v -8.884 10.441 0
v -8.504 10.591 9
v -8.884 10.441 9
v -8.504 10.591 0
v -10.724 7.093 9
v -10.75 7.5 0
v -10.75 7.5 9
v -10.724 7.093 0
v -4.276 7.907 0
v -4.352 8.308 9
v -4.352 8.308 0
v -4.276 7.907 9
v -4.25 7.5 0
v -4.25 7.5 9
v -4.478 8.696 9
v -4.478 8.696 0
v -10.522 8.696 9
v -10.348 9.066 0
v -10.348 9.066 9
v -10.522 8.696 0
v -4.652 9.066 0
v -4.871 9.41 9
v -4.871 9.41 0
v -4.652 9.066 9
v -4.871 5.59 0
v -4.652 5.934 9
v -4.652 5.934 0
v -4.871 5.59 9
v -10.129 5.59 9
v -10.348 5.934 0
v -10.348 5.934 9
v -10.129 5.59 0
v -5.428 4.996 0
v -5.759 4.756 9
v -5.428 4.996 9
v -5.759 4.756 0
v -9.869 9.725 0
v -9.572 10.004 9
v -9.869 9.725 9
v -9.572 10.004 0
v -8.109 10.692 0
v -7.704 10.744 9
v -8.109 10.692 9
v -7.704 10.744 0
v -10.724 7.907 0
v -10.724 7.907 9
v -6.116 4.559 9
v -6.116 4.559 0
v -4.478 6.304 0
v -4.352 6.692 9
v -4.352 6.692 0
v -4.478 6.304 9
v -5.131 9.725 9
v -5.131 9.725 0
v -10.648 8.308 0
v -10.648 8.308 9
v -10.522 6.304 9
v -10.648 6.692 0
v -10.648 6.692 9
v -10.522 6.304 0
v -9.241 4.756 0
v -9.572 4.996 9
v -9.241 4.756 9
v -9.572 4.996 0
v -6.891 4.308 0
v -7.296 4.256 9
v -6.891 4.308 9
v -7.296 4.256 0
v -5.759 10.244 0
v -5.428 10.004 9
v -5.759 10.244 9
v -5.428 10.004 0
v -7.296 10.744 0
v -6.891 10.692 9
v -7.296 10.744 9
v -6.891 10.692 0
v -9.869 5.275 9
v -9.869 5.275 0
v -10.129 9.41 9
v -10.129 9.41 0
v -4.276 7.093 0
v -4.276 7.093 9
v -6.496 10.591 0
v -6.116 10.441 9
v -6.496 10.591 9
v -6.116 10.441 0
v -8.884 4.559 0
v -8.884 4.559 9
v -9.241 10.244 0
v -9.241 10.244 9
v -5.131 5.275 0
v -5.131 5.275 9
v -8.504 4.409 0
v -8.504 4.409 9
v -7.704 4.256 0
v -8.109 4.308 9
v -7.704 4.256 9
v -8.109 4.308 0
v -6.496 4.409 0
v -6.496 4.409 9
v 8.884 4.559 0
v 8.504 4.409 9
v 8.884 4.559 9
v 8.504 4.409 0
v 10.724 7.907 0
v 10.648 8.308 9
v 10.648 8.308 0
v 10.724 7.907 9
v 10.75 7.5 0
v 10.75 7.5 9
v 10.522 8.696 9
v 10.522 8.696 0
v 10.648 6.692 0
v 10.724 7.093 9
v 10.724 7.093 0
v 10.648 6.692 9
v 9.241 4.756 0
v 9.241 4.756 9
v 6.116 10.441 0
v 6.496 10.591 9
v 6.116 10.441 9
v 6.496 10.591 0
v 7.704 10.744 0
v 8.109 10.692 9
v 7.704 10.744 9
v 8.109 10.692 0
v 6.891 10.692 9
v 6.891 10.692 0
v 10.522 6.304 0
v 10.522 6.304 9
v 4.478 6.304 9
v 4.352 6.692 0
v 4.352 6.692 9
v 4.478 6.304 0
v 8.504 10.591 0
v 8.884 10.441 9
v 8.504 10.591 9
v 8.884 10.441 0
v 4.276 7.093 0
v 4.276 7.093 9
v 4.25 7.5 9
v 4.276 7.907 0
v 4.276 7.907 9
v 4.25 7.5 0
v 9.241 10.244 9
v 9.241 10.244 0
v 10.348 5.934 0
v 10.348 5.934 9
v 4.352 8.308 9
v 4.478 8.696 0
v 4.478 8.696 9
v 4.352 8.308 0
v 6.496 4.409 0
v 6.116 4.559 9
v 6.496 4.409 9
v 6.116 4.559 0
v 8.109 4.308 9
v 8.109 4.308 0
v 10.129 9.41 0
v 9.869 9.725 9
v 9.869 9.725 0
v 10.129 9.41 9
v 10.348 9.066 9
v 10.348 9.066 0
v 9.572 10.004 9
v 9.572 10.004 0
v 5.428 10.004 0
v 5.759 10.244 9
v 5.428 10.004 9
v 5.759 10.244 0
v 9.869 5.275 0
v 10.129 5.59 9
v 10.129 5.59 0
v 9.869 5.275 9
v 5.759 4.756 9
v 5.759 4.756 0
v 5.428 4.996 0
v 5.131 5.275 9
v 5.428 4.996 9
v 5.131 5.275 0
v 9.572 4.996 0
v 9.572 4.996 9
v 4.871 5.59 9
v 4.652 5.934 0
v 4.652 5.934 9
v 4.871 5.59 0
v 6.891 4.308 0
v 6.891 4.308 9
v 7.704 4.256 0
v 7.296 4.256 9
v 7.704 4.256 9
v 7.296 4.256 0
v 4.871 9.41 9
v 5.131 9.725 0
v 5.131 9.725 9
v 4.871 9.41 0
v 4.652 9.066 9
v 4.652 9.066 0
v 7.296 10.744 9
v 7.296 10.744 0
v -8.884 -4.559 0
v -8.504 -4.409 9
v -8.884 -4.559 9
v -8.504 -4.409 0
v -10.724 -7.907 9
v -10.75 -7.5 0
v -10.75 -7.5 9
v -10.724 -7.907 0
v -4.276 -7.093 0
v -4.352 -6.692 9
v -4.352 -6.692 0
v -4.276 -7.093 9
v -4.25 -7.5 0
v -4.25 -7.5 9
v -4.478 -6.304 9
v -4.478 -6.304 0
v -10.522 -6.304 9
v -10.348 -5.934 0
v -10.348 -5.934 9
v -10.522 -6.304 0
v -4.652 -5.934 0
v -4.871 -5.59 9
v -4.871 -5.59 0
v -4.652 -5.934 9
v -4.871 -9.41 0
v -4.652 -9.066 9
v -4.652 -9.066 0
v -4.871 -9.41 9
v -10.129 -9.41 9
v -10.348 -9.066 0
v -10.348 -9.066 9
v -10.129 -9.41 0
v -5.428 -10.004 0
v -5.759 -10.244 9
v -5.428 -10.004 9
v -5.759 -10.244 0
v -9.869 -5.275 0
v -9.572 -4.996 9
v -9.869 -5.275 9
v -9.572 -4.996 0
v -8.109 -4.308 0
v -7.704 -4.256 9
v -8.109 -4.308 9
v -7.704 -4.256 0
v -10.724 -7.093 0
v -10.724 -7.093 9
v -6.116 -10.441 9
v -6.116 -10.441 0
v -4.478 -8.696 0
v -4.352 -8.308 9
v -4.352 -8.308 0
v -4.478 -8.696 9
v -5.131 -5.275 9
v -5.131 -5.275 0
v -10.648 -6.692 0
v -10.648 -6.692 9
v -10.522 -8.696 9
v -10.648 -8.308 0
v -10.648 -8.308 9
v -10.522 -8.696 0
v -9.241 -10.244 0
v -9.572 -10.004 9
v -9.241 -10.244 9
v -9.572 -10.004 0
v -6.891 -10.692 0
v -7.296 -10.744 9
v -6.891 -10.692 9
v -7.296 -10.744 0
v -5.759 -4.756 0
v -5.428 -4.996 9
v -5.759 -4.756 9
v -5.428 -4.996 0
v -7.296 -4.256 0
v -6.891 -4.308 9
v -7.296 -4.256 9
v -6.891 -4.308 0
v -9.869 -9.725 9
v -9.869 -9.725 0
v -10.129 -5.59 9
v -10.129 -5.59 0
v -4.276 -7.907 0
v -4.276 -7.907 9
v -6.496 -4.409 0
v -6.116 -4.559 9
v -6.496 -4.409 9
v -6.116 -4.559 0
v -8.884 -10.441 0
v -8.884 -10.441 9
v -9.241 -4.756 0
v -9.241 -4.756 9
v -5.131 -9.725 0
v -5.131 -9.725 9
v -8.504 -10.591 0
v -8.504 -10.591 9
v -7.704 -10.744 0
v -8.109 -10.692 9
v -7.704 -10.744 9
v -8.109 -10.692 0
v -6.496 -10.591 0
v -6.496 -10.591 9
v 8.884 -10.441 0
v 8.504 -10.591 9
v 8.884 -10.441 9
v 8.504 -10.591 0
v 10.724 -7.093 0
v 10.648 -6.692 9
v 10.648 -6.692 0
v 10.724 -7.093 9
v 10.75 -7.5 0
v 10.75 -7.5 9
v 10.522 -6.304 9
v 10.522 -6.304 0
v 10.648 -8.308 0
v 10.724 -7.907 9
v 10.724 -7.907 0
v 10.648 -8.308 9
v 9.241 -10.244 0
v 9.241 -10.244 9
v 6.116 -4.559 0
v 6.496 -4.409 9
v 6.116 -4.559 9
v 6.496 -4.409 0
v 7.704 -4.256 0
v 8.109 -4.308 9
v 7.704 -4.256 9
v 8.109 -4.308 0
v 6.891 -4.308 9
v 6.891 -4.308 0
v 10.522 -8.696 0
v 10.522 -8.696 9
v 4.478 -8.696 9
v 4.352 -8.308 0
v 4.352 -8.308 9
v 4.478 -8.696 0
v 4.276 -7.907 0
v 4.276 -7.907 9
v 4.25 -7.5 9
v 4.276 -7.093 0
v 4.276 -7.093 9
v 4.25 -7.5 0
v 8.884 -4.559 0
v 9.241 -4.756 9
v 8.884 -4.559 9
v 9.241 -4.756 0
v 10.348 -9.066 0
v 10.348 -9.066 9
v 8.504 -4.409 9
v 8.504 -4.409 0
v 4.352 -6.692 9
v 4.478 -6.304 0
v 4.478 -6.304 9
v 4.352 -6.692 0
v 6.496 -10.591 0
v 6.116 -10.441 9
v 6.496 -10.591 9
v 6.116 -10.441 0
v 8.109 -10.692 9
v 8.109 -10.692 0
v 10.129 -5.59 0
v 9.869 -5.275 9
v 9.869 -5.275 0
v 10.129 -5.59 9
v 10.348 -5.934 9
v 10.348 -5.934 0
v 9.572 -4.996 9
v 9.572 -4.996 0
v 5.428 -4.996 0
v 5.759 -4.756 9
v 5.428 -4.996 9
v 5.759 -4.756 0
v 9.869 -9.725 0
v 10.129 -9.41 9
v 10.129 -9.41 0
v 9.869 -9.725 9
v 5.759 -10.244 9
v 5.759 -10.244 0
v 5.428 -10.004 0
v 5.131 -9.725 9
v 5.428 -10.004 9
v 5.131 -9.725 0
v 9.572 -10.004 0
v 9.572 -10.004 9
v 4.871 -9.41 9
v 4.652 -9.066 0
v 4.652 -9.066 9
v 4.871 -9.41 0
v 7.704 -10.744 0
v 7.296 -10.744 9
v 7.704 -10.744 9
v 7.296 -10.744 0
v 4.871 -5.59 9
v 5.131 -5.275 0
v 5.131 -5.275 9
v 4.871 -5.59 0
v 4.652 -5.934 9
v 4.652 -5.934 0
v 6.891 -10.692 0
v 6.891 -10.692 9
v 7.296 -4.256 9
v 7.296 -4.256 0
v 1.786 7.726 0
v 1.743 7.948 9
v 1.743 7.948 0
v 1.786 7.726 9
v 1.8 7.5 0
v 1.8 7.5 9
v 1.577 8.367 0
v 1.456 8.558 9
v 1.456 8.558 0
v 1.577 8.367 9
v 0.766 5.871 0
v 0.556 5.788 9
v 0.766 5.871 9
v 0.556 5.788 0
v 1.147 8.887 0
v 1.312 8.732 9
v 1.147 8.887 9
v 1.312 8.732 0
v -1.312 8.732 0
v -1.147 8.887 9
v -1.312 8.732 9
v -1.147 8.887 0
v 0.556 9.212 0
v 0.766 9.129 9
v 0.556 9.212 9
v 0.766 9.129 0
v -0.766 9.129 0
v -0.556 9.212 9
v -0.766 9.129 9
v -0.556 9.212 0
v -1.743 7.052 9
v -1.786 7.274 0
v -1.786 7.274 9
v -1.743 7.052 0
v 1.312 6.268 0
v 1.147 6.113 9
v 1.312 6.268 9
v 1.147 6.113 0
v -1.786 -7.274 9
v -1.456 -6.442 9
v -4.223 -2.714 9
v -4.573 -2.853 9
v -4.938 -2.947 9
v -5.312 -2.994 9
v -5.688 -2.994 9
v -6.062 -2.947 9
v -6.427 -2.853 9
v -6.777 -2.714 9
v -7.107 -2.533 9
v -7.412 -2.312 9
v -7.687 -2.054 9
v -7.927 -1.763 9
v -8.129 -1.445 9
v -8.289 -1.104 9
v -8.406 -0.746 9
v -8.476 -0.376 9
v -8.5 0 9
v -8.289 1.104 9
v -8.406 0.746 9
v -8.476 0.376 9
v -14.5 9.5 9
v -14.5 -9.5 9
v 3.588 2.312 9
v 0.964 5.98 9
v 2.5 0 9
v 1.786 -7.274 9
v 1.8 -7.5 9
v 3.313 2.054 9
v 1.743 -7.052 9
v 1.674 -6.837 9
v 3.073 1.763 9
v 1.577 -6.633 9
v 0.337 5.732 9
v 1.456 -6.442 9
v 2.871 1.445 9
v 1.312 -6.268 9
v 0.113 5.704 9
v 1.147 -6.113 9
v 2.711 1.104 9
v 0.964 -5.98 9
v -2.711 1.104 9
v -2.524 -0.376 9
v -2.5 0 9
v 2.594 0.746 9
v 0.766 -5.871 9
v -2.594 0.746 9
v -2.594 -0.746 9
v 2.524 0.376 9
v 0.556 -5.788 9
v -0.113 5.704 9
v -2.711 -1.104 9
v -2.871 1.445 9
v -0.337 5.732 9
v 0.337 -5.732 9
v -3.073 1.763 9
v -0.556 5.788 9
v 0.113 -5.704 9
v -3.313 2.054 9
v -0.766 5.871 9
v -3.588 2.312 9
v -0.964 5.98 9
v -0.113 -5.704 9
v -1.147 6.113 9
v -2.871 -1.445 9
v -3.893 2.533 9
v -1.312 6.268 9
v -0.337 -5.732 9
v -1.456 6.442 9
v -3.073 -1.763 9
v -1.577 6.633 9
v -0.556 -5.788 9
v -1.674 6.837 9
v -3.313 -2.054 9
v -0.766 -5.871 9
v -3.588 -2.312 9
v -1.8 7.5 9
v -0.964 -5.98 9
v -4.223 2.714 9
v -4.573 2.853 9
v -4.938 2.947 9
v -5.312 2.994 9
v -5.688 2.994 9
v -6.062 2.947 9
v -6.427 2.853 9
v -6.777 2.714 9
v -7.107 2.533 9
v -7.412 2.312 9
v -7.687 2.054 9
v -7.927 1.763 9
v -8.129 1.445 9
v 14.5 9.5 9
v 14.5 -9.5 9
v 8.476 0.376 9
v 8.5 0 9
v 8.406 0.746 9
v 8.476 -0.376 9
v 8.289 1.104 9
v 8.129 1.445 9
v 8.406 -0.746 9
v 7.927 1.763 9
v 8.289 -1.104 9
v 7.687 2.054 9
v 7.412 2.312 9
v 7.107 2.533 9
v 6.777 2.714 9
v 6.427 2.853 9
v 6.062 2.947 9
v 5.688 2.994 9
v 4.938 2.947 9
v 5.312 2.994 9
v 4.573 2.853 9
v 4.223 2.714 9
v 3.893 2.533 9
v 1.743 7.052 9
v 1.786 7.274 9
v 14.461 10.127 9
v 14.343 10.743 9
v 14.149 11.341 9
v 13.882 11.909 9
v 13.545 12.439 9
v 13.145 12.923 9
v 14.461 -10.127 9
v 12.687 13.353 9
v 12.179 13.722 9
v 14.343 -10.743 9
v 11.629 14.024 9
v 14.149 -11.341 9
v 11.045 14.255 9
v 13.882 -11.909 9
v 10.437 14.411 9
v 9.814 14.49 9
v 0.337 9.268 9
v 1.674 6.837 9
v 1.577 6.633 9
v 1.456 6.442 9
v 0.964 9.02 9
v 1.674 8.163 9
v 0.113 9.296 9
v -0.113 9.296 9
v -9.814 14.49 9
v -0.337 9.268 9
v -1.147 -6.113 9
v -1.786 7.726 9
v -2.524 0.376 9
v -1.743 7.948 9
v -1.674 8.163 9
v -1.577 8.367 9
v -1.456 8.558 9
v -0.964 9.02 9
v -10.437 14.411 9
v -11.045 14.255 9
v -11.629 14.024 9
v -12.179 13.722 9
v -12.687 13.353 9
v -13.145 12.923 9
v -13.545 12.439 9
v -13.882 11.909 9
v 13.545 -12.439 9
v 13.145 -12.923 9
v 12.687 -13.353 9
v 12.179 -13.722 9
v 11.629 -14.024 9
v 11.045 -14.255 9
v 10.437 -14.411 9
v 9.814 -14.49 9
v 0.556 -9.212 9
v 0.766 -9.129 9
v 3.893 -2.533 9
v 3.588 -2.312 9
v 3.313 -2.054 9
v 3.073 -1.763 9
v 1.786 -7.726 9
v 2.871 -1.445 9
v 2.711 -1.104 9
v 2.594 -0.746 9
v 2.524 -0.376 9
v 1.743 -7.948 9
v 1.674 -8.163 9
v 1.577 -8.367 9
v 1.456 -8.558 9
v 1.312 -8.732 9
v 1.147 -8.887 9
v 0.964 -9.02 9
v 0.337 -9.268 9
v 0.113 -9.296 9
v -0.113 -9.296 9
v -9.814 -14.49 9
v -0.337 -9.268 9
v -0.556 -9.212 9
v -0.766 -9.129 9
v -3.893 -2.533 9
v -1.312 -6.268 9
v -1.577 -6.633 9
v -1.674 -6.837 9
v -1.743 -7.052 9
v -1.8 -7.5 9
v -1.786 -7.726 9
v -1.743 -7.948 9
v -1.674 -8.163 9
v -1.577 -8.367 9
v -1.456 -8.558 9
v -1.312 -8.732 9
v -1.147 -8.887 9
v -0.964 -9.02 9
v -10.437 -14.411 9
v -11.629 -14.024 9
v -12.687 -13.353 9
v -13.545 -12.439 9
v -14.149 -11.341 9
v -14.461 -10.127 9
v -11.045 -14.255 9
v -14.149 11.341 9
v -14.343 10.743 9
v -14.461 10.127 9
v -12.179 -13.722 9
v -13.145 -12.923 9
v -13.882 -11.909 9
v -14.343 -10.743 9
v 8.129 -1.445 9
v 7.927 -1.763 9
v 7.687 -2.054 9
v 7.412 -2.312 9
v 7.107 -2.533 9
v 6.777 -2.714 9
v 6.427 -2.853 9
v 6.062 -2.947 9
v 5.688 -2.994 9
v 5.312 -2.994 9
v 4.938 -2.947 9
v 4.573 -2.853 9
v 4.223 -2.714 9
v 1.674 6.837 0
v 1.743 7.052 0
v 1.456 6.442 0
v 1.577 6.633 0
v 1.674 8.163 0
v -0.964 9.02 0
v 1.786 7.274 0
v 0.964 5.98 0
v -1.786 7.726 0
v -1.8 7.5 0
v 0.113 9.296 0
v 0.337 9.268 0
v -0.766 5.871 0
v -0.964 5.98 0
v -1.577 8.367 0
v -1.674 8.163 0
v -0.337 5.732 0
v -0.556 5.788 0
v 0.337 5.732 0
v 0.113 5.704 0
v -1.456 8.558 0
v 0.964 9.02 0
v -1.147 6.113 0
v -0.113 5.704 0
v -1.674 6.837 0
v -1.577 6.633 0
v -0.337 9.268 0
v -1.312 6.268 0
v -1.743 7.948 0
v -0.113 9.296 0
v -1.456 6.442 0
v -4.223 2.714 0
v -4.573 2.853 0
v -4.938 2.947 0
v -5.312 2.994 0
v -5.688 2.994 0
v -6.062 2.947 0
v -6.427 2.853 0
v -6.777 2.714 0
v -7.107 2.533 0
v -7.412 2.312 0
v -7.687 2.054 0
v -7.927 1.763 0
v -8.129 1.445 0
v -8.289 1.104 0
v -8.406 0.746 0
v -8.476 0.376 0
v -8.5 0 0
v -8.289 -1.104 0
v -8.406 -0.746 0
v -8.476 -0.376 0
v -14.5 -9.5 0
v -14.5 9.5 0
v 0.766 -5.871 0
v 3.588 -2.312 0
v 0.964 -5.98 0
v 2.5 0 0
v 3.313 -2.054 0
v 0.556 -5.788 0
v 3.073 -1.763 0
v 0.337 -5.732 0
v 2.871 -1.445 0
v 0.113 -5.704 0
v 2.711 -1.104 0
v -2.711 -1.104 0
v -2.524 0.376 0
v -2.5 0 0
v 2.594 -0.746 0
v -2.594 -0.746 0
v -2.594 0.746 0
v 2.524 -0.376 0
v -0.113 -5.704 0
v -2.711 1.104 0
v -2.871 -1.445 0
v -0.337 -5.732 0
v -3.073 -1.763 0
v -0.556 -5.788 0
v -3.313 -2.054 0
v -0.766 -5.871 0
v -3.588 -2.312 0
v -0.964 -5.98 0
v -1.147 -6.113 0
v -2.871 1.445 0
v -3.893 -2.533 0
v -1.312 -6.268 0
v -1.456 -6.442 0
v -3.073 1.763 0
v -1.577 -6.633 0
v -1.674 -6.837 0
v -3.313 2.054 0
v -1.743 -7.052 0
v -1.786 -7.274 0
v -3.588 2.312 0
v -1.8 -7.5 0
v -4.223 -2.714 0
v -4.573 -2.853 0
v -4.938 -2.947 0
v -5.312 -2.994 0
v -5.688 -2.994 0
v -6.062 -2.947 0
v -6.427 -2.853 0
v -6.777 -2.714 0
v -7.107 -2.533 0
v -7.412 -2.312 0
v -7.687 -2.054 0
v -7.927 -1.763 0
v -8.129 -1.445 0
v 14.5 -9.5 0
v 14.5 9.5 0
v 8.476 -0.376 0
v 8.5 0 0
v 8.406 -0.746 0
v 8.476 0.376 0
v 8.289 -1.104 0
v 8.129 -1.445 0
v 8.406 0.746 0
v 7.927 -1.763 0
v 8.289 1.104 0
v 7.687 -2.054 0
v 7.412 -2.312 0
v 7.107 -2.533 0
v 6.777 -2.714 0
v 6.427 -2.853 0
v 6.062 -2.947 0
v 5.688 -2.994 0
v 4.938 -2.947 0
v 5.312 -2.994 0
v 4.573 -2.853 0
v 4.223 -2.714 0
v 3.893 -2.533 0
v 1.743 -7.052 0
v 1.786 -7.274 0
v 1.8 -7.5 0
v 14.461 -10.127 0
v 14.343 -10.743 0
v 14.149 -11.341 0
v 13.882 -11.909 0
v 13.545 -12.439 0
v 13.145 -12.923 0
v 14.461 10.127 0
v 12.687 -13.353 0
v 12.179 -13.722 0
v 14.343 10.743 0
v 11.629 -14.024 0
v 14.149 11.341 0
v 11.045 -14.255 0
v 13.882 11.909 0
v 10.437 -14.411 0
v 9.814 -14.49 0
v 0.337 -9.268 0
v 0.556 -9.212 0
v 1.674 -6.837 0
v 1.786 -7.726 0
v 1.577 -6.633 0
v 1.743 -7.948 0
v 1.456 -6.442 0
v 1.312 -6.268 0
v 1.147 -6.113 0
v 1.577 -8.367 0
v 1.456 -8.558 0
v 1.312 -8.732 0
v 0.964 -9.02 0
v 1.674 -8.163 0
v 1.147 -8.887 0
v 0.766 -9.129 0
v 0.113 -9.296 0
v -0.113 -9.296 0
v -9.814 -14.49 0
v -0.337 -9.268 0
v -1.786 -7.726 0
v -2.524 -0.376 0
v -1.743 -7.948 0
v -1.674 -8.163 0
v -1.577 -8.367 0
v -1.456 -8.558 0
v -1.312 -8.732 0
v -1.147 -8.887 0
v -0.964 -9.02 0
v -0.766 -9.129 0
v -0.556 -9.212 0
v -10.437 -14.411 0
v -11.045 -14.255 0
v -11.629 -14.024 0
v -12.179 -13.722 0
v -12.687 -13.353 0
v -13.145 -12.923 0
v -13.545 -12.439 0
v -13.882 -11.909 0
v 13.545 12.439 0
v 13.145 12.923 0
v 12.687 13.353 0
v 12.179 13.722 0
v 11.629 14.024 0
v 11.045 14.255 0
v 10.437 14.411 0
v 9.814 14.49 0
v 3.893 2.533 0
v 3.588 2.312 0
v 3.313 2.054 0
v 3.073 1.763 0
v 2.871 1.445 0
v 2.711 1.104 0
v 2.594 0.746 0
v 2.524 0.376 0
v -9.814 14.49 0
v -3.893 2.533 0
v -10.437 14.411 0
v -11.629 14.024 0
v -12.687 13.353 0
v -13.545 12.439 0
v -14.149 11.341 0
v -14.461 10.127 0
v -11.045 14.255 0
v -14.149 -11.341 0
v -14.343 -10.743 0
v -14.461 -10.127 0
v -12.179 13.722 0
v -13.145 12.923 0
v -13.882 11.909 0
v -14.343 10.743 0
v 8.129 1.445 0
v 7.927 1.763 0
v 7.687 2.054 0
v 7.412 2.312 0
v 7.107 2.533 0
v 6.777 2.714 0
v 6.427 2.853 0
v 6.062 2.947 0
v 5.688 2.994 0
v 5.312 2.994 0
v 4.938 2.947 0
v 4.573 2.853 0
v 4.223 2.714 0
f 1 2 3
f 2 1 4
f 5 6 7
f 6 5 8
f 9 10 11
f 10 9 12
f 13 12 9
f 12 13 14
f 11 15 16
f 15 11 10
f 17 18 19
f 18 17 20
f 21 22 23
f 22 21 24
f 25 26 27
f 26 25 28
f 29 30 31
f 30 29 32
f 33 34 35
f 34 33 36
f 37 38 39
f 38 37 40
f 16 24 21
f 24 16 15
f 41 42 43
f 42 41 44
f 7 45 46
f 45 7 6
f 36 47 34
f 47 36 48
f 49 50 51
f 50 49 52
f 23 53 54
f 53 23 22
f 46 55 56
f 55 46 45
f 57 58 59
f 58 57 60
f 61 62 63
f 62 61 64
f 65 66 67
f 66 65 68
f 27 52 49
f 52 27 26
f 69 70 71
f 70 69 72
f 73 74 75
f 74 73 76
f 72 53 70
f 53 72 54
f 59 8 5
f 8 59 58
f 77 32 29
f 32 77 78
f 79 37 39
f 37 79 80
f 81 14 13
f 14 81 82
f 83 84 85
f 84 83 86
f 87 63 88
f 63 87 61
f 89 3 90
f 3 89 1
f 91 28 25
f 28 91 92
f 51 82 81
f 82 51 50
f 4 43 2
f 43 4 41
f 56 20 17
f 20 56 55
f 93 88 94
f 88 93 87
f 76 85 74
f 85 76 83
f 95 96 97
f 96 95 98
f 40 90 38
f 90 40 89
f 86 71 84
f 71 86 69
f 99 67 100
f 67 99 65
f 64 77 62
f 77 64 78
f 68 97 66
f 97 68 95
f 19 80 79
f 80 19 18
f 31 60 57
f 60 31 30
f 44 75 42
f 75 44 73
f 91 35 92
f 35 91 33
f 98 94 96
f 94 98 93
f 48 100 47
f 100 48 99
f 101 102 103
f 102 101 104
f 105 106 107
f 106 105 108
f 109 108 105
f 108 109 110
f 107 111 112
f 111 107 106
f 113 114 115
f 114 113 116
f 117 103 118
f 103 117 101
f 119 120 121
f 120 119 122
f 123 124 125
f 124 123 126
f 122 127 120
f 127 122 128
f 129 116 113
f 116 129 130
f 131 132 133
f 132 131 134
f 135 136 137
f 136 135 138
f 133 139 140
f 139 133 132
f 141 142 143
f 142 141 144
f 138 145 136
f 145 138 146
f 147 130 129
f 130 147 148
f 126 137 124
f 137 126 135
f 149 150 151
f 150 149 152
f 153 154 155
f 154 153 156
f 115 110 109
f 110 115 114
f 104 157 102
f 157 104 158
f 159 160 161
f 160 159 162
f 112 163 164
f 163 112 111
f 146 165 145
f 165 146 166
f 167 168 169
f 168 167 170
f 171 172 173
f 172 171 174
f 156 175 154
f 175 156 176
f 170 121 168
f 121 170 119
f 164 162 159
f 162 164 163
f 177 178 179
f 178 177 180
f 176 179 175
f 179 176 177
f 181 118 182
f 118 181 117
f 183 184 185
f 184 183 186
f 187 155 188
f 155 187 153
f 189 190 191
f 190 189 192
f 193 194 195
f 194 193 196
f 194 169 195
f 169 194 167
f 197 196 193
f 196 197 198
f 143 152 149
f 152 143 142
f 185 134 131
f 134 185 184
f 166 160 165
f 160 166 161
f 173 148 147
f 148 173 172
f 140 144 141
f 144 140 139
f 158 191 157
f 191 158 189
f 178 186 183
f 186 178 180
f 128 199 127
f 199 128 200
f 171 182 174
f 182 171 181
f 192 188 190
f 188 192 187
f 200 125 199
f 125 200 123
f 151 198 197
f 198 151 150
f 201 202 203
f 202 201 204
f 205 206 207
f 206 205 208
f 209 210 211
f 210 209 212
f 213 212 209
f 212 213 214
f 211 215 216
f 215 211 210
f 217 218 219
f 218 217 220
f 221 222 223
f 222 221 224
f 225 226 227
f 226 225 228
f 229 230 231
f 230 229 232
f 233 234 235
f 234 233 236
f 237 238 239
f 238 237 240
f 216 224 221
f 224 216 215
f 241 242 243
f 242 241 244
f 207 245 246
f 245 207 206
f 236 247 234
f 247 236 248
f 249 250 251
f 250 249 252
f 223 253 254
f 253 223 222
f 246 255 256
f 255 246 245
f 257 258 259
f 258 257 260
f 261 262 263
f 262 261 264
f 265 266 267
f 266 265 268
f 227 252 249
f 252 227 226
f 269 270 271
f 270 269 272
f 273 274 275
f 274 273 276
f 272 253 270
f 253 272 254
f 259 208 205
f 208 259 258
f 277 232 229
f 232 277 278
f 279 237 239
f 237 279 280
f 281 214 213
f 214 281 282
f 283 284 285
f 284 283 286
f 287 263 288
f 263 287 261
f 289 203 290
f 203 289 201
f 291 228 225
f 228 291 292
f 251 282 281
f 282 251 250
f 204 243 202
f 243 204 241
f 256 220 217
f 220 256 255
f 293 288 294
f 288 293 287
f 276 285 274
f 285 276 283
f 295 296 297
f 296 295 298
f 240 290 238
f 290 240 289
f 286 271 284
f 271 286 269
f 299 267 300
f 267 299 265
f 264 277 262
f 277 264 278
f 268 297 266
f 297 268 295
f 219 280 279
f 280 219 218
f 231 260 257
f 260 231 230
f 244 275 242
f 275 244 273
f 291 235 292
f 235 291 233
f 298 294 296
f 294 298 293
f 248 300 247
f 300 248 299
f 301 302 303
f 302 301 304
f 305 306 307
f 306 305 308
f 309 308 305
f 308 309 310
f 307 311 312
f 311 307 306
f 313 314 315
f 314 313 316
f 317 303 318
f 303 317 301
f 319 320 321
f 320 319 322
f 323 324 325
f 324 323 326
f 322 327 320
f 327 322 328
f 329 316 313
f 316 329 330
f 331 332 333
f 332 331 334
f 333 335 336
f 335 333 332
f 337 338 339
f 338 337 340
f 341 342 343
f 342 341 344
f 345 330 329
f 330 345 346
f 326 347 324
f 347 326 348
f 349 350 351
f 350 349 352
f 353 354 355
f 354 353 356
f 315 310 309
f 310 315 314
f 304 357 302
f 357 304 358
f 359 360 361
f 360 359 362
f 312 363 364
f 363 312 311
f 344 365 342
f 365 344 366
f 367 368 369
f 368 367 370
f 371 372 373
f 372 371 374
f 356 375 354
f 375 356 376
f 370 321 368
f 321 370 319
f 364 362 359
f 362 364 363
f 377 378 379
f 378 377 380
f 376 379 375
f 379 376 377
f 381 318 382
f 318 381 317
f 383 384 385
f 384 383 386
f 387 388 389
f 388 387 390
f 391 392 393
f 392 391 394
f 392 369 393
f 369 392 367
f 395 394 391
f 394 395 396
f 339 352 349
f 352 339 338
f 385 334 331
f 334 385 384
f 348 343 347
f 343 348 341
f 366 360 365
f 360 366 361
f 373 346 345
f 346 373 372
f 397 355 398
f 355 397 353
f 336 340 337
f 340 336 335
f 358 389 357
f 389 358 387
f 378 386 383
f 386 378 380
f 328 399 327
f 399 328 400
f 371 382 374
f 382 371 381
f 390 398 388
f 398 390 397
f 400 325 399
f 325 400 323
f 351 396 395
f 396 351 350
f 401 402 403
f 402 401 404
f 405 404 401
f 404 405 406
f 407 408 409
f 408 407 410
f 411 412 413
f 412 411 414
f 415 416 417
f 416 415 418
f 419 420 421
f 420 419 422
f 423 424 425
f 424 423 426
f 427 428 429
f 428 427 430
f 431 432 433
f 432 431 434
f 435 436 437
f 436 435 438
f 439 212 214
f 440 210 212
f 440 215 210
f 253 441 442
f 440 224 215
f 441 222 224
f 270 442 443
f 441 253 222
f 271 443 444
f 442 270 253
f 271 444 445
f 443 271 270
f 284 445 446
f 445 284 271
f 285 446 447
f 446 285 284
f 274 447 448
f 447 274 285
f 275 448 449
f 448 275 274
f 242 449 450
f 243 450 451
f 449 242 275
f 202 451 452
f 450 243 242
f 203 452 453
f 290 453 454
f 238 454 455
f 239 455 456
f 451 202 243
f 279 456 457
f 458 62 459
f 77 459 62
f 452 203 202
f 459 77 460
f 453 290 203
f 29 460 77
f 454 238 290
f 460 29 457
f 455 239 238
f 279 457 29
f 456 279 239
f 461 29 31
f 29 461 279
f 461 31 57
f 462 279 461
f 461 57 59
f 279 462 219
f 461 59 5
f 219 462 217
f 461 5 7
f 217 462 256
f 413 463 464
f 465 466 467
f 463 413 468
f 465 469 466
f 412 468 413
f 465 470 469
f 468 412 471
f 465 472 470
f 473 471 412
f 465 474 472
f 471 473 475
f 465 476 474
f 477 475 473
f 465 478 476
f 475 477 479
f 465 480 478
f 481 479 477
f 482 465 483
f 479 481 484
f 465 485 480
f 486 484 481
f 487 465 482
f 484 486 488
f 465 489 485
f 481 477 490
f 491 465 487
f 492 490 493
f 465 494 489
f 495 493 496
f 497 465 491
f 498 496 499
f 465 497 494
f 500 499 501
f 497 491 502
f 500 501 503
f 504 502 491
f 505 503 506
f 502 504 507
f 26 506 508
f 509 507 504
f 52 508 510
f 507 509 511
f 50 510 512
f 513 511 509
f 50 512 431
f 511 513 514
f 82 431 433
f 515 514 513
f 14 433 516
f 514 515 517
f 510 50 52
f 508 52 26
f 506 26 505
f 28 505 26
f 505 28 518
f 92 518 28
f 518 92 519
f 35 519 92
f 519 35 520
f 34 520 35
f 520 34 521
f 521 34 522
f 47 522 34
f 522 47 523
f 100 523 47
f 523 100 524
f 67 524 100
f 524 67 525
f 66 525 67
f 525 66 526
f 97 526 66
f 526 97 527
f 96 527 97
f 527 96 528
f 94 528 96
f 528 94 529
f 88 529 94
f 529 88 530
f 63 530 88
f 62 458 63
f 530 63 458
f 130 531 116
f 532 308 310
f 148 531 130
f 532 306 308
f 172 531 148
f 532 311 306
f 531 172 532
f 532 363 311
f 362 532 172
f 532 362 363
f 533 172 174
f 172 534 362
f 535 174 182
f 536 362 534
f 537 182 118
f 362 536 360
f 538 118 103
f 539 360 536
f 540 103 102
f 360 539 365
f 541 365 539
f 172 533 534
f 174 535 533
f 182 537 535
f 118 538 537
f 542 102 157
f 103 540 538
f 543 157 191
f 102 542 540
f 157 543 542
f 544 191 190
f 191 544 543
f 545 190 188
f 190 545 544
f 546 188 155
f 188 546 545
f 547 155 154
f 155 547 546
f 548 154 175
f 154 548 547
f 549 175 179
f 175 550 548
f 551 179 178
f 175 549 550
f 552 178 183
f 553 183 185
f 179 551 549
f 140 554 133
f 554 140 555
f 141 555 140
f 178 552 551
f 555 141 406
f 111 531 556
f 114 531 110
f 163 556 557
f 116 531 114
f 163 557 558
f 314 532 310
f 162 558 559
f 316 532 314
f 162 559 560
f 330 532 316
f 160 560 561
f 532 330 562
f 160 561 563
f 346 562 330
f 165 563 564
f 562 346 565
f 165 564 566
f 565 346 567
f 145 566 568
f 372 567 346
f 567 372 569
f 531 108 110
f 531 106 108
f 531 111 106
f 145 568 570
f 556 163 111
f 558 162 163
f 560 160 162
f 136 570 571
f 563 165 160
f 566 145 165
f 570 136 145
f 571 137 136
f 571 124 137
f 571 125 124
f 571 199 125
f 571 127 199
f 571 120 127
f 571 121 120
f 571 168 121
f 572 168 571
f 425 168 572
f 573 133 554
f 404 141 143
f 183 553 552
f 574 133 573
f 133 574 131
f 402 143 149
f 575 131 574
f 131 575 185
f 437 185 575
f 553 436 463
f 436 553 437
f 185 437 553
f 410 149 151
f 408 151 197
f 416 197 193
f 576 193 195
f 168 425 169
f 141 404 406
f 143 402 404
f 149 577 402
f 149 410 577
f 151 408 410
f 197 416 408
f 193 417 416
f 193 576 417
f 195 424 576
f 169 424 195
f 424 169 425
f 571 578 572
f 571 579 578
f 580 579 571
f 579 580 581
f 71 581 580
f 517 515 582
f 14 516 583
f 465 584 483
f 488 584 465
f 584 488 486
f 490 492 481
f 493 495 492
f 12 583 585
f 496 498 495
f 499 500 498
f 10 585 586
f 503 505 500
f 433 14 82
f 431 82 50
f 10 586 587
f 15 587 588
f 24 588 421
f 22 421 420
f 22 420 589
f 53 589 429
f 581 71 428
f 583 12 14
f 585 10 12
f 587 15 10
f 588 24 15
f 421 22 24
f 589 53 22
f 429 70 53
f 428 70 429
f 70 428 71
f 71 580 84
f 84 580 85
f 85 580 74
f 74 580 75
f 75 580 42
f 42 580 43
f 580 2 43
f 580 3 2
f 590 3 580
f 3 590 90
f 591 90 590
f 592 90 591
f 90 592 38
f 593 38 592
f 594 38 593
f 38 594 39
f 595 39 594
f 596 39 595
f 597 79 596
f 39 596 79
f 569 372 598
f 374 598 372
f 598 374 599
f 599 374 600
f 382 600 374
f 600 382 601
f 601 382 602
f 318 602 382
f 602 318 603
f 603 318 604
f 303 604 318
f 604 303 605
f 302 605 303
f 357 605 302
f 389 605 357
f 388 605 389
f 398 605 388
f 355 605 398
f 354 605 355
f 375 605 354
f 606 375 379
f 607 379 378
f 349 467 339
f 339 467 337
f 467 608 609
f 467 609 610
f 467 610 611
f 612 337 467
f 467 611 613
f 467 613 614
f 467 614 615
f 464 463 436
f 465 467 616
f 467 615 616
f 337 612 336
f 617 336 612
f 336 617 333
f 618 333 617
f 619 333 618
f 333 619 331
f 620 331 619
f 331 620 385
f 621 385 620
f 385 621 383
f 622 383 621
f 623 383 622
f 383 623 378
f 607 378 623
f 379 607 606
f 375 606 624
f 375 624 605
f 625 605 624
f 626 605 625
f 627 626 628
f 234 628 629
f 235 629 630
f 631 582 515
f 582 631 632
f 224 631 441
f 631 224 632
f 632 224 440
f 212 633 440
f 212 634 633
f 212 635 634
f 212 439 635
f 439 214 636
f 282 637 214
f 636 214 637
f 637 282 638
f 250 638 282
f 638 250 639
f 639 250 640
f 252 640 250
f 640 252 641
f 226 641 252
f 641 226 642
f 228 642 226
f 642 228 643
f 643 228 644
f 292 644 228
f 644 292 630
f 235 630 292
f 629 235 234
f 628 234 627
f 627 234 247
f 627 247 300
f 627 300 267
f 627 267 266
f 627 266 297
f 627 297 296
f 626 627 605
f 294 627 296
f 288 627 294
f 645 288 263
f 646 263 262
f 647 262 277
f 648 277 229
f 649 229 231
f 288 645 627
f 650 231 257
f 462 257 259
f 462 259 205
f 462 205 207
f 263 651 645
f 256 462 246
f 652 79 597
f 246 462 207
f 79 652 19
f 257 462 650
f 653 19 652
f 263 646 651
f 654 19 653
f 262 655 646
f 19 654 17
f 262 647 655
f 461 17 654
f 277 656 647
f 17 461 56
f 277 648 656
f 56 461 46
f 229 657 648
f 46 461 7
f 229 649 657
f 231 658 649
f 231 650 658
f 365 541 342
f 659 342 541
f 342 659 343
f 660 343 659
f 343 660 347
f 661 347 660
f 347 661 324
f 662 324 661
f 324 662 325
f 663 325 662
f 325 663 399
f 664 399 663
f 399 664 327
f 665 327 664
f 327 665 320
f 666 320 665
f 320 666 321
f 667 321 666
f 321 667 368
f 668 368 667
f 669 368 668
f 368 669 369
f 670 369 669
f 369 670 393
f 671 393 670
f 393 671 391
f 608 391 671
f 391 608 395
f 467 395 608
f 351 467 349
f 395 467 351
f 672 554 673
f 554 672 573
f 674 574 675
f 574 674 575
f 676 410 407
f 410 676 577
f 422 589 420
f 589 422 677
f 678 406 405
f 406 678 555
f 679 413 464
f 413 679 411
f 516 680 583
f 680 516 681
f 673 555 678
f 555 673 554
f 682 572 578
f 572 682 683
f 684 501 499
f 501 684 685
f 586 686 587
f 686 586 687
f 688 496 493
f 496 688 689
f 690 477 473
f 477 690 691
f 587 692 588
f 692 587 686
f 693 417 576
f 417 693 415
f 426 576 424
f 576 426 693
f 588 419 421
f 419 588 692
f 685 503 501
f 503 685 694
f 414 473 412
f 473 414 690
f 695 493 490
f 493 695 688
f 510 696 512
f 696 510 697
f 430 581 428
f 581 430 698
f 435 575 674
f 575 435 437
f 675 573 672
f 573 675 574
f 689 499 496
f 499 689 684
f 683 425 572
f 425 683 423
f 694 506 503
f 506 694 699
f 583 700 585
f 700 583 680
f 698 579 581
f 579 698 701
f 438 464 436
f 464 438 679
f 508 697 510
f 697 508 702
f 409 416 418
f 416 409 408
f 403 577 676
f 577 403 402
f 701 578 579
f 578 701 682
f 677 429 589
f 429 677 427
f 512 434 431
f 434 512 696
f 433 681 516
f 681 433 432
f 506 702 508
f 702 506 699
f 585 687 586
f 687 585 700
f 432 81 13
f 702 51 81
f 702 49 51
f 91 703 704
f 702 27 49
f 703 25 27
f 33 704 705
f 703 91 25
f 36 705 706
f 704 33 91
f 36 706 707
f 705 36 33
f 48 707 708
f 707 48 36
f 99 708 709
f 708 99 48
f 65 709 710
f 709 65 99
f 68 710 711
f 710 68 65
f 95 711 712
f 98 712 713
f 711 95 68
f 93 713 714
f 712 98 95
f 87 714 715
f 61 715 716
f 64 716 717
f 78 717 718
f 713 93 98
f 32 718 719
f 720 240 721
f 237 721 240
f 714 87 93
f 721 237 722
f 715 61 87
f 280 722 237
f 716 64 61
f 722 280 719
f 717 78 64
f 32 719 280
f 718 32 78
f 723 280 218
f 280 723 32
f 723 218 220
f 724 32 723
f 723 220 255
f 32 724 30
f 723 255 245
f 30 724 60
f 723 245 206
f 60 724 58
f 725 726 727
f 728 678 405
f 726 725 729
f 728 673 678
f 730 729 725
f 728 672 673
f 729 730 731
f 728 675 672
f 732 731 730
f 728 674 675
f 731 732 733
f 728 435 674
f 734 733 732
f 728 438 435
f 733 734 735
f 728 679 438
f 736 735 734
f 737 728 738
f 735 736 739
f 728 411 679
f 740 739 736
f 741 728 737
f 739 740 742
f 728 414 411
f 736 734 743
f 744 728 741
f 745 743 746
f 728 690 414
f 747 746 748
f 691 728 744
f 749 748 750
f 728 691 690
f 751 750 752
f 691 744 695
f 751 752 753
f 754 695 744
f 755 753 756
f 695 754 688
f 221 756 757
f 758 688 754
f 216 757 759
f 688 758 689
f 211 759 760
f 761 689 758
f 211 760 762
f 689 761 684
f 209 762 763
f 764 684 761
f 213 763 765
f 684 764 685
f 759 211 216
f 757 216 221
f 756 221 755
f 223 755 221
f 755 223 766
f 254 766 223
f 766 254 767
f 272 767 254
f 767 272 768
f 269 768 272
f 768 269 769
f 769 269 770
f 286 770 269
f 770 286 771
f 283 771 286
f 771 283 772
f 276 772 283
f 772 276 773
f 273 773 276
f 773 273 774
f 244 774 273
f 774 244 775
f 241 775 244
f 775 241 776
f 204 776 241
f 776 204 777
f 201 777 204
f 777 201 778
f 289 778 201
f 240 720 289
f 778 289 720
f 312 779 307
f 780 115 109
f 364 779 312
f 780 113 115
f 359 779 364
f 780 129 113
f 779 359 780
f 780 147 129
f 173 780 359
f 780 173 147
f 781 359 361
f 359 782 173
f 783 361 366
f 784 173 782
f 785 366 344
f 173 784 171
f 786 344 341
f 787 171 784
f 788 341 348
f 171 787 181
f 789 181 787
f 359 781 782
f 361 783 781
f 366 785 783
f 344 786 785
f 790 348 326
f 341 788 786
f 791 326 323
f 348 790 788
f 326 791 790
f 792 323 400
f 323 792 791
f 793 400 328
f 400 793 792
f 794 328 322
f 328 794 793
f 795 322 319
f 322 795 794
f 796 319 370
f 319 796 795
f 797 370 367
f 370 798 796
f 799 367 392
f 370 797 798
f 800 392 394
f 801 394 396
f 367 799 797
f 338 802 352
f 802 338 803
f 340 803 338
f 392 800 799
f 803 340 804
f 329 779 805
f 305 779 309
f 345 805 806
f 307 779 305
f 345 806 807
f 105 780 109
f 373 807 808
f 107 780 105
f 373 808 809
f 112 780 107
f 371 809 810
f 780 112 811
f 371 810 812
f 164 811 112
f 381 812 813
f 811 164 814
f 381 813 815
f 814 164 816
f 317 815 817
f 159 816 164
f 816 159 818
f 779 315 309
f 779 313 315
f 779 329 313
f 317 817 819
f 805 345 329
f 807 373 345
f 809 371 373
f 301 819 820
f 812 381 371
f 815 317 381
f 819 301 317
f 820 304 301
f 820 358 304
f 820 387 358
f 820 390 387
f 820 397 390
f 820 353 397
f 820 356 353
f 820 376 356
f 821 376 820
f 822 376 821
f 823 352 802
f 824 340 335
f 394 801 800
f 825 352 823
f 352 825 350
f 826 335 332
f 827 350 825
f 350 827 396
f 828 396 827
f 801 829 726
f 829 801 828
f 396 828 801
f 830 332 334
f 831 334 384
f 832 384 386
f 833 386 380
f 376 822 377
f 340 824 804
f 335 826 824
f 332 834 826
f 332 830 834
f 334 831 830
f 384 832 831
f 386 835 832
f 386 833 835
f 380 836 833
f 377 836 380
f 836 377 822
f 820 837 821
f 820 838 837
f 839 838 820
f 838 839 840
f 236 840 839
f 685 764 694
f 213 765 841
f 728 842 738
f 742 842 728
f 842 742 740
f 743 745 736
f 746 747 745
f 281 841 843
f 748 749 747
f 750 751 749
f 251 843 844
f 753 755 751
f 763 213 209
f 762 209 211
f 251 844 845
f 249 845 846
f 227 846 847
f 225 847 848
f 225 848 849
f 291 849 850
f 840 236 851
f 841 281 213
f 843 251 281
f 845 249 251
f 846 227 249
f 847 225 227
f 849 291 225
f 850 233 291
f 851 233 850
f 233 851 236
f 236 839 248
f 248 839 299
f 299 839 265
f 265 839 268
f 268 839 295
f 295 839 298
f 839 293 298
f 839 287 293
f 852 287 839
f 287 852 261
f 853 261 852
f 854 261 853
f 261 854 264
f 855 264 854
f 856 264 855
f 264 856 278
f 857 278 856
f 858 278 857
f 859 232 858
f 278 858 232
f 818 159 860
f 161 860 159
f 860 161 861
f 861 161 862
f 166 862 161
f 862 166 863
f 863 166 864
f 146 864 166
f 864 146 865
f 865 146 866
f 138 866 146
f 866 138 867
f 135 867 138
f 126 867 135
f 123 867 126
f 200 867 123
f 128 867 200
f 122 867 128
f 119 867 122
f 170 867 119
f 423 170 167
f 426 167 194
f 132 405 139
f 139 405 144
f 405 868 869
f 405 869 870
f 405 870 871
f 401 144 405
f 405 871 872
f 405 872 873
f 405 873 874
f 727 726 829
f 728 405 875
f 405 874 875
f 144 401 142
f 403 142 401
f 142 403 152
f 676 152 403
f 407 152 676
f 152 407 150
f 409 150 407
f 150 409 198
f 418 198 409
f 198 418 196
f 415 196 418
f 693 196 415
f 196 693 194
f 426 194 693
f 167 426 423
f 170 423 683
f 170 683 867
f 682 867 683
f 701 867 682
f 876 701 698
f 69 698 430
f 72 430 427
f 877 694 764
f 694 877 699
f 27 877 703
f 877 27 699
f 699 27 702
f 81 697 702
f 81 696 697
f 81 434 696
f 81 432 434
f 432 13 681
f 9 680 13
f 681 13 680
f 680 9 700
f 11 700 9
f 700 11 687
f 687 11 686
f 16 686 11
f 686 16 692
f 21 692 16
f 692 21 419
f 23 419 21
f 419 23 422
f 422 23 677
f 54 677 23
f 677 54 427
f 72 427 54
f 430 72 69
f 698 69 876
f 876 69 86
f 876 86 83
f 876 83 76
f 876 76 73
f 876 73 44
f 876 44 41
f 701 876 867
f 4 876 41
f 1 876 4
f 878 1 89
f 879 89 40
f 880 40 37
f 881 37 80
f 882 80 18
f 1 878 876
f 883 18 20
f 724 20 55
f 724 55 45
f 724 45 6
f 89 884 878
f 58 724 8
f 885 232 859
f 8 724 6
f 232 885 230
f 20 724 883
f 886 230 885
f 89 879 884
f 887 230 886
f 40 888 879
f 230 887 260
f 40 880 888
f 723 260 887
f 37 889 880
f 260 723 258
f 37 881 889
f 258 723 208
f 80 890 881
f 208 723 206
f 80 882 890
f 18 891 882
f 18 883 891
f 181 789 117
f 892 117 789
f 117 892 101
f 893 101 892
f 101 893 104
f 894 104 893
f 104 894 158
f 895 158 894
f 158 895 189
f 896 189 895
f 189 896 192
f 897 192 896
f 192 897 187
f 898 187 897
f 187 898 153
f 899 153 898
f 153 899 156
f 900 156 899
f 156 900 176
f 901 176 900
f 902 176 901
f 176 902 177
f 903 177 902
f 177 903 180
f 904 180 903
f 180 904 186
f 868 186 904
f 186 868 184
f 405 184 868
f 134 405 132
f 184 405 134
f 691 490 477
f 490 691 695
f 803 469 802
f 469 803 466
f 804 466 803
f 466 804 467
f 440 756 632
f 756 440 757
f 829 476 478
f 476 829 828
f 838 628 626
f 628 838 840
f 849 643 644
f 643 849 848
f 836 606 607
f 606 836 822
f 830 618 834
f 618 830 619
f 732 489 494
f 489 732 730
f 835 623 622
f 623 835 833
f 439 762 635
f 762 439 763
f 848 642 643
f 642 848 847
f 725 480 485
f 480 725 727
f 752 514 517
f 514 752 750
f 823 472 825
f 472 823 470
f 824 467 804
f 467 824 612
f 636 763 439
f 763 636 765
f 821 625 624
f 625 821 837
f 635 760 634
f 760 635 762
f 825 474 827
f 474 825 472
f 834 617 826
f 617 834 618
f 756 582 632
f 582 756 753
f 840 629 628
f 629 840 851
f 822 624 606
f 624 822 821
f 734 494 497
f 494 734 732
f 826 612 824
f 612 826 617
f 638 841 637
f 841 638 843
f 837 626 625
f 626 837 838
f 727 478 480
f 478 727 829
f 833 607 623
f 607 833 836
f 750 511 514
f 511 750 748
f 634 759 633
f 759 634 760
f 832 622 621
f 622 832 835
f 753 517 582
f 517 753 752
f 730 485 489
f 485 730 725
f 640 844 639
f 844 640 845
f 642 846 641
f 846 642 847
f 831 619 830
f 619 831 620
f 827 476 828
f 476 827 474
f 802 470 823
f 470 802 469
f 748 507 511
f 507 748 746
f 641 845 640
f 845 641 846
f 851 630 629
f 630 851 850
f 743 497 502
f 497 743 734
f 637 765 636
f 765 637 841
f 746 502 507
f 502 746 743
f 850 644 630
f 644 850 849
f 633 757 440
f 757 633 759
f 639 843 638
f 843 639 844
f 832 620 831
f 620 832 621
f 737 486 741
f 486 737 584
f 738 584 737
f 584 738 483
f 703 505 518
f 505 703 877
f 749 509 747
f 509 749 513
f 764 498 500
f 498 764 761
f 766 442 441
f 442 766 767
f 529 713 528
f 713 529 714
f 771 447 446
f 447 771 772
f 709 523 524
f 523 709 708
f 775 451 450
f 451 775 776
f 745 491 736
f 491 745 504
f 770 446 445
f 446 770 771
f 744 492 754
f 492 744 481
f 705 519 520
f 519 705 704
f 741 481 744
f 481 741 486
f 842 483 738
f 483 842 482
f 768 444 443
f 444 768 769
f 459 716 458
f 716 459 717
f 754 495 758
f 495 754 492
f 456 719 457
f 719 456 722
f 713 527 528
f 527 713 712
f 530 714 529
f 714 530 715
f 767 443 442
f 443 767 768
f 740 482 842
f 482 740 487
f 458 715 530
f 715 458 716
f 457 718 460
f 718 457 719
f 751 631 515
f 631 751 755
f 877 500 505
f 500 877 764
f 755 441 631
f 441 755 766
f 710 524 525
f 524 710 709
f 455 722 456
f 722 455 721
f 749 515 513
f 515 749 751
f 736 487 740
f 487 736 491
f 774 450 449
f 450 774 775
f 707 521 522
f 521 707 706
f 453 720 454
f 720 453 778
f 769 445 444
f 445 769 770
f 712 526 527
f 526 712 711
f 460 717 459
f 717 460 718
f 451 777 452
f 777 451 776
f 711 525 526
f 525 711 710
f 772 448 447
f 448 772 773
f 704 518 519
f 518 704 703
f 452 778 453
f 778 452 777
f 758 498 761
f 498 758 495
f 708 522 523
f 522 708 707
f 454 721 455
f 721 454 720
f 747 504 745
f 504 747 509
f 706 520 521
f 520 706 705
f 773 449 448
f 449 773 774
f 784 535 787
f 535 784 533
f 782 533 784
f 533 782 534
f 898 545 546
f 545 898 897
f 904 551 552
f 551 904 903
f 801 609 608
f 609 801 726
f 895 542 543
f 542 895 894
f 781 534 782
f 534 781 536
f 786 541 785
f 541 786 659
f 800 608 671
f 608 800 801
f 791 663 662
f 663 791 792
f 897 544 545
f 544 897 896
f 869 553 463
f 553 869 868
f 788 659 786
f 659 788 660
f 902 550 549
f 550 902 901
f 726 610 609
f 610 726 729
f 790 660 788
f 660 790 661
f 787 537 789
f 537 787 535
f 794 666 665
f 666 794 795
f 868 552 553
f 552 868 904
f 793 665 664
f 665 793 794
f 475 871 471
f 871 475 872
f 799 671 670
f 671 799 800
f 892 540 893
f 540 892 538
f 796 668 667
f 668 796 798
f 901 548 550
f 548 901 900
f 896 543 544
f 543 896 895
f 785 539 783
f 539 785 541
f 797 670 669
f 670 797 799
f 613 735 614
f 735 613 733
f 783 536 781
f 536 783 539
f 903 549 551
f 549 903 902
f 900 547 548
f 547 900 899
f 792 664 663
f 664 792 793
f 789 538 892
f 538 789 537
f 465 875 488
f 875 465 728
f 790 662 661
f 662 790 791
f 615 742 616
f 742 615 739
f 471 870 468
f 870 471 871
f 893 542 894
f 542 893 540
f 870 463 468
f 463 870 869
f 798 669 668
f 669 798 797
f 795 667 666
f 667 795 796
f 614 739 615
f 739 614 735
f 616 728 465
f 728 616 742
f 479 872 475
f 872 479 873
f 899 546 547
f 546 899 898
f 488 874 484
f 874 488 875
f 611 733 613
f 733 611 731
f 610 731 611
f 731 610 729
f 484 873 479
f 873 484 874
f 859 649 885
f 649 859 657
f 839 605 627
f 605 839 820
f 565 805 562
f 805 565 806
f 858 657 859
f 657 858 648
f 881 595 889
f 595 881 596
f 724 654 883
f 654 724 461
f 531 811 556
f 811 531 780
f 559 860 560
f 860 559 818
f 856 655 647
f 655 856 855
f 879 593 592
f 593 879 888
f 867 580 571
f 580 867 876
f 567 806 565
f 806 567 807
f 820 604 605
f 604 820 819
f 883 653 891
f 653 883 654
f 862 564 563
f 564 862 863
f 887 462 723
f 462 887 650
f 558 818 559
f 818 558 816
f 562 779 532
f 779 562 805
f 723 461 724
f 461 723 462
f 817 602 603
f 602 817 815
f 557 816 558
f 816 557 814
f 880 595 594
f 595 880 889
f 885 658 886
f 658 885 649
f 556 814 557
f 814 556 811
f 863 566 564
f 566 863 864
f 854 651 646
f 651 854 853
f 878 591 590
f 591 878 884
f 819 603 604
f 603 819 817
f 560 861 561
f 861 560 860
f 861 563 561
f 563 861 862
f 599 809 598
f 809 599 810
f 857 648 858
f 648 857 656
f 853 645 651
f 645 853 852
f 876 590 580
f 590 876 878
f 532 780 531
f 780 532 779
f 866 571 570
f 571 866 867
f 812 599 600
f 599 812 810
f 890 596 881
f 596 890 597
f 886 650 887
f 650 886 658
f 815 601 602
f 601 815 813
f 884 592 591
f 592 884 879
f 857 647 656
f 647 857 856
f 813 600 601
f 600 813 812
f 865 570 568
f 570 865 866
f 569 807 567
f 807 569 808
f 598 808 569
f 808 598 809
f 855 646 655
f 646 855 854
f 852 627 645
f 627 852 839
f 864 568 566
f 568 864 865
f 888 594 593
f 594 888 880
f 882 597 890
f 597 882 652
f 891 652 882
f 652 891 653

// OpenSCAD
$fn = 50;


difference() {
	union() {
		hull() {
			translate(v = [-9.5000000000, 9.5000000000, 0]) {
				cylinder(h = 9, r = 5);
			}
			translate(v = [9.5000000000, 9.5000000000, 0]) {
				cylinder(h = 9, r = 5);
			}
			translate(v = [-9.5000000000, -9.5000000000, 0]) {
				cylinder(h = 9, r = 5);
			}
			translate(v = [9.5000000000, -9.5000000000, 0]) {
				cylinder(h = 9, r = 5);
			}
		}
	}
	union() {
		#translate(v = [-7.5000000000, 7.5000000000, 0]) {
			cylinder(h = 9, r = 3.2500000000);
		}
		#translate(v = [7.5000000000, 7.5000000000, 0]) {
			cylinder(h = 9, r = 3.2500000000);
		}
		#translate(v = [-7.5000000000, -7.5000000000, 0]) {
			cylinder(h = 9, r = 3.2500000000);
		}
		#translate(v = [7.5000000000, -7.5000000000, 0]) {
			cylinder(h = 9, r = 3.2500000000);
		}
		#translate(v = [-7.5000000000, -7.5000000000, -100.0000000000]) {
			cylinder(h = 200, r = 3.2500000000);
		}
		#translate(v = [-7.5000000000, 7.5000000000, -100.0000000000]) {
			cylinder(h = 200, r = 3.2500000000);
		}
		#translate(v = [7.5000000000, -7.5000000000, -100.0000000000]) {
			cylinder(h = 200, r = 3.2500000000);
		}
		#translate(v = [7.5000000000, 7.5000000000, -100.0000000000]) {
			cylinder(h = 200, r = 3.2500000000);
		}
		#translate(v = [-7.5000000000, 7.5000000000, 0]) {
			cylinder(h = 9, r = 1.8000000000);
		}
		#translate(v = [0.0000000000, 7.5000000000, 0]) {
			cylinder(h = 9, r = 1.8000000000);
		}
		#translate(v = [7.5000000000, 7.5000000000, 0]) {
			cylinder(h = 9, r = 1.8000000000);
		}
		#translate(v = [-7.5000000000, -7.5000000000, 0]) {
			cylinder(h = 9, r = 1.8000000000);
		}
		#translate(v = [0.0000000000, -7.5000000000, 0]) {
			cylinder(h = 9, r = 1.8000000000);
		}
		#translate(v = [7.5000000000, -7.5000000000, 0]) {
			cylinder(h = 9, r = 1.8000000000);
		}
		#translate(v = [-7.5000000000, 7.5000000000, 0]) {
			cylinder(h = 9, r = 1.8000000000);
		}
		#translate(v = [0.0000000000, 7.5000000000, 0]) {
			cylinder(h = 9, r = 1.8000000000);
		}
		#translate(v = [7.5000000000, 7.5000000000, 0]) {
			cylinder(h = 9, r = 1.8000000000);
		}
		#translate(v = [-7.5000000000, -7.5000000000, 0]) {
			cylinder(h = 9, r = 1.8000000000);
		}
		#translate(v = [0.0000000000, -7.5000000000, 0]) {
			cylinder(h = 9, r = 1.8000000000);
		}
		#translate(v = [7.5000000000, -7.5000000000, 0]) {
			cylinder(h = 9, r = 1.8000000000);
		}
		#translate(v = [-7.5000000000, 7.5000000000, 0]) {
			cylinder(h = 9, r = 1.8000000000);
		}
		#translate(v = [0.0000000000, 7.5000000000, 0]) {
			cylinder(h = 9, r = 1.8000000000);
		}
		#translate(v = [7.5000000000, 7.5000000000, 0]) {
			cylinder(h = 9, r = 1.8000000000);
		}
		#translate(v = [-7.5000000000, -7.5000000000, 0]) {
			cylinder(h = 9, r = 1.8000000000);
		}
		#translate(v = [0.0000000000, -7.5000000000, 0]) {
			cylinder(h = 9, r = 1.8000000000);
		}
		#translate(v = [7.5000000000, -7.5000000000, 0]) {
			cylinder(h = 9, r = 1.8000000000);
		}
		#translate(v = [-5.5000000000, 0, 0]) {
			cylinder(h = 9, r = 3.0000000000);
		}
		#translate(v = [5.5000000000, 0, 0]) {
			cylinder(h = 9, r = 3.0000000000);
		}
	}
}
